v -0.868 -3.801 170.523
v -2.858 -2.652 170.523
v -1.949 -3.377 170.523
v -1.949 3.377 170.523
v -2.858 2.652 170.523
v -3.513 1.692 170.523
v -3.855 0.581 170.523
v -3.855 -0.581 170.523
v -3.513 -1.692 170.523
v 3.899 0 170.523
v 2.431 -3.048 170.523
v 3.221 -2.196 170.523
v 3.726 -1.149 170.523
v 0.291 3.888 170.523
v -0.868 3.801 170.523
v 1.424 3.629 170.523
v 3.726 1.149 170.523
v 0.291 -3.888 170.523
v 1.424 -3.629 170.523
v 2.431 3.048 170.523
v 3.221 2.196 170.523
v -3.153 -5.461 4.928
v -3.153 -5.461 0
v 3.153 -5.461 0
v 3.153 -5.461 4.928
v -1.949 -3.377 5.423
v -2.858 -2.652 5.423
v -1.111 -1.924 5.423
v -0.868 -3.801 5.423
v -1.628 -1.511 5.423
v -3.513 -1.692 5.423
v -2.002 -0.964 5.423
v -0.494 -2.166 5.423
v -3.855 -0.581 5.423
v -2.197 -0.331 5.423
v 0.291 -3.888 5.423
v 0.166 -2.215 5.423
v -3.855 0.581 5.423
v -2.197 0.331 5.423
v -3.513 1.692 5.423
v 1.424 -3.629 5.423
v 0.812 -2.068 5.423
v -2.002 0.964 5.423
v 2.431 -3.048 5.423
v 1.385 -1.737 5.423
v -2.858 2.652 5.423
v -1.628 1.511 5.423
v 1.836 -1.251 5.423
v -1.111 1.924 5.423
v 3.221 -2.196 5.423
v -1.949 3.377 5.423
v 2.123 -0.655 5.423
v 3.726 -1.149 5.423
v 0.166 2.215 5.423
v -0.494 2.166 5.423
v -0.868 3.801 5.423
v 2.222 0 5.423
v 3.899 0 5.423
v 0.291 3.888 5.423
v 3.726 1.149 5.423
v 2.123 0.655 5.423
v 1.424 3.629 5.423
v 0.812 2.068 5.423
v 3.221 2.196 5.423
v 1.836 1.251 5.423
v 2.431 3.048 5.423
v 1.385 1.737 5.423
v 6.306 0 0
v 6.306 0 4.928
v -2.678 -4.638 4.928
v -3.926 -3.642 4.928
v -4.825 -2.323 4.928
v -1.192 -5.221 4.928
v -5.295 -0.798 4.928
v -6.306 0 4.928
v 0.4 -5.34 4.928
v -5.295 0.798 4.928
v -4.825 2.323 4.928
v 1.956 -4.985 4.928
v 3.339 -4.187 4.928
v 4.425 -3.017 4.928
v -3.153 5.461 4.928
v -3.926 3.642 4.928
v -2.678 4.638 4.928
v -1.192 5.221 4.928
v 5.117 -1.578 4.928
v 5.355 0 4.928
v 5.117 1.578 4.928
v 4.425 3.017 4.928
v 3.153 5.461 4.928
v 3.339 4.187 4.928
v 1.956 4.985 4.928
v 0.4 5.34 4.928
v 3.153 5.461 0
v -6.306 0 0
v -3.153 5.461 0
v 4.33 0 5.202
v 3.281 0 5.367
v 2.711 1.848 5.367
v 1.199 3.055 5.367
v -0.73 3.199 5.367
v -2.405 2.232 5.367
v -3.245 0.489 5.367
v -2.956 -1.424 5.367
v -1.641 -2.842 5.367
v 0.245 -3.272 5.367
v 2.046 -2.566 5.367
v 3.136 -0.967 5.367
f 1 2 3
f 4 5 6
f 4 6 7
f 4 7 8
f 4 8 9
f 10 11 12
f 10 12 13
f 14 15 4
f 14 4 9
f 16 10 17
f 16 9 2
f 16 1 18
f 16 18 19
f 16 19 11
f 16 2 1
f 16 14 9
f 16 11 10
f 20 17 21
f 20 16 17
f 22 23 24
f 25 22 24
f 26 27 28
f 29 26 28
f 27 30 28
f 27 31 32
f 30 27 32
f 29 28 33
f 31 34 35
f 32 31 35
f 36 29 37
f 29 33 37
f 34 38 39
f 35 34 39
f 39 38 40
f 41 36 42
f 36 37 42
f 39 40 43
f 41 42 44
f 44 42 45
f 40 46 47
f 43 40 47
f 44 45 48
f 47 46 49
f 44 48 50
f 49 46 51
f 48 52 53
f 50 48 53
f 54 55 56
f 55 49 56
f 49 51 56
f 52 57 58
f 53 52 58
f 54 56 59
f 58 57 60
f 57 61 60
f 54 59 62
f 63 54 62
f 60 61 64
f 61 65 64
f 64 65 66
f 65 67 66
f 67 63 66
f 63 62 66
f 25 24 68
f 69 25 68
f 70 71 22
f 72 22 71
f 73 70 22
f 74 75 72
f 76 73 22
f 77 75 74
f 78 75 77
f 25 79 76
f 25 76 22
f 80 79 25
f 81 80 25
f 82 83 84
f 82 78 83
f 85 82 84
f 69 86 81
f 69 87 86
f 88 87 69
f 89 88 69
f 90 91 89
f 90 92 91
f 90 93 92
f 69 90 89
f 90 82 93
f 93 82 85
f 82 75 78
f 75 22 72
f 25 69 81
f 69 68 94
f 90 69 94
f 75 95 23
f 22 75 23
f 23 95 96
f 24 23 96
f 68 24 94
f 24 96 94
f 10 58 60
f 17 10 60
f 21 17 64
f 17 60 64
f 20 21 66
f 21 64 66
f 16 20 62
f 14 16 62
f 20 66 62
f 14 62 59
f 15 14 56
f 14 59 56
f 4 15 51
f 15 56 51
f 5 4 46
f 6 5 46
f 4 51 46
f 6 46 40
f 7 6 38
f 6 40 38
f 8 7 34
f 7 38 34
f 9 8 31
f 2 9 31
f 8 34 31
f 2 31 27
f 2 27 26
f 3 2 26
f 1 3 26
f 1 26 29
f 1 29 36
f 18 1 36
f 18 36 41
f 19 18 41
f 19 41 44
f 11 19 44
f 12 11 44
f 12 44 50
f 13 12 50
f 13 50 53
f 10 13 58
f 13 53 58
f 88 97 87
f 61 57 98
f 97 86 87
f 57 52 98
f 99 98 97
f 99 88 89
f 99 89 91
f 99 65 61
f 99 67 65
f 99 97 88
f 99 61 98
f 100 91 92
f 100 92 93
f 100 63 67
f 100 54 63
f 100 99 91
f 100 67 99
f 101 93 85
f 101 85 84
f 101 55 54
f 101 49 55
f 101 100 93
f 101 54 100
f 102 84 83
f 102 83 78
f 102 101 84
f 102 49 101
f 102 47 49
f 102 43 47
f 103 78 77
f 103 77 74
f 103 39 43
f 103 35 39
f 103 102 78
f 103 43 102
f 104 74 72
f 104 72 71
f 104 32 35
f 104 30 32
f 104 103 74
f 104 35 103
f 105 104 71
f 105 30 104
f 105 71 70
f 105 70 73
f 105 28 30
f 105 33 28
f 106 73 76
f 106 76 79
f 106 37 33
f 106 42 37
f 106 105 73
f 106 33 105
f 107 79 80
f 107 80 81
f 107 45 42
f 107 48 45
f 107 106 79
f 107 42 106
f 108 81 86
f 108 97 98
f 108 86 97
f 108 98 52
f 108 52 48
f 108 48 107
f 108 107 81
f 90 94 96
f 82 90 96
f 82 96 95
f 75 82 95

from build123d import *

# Parameters (mm, degrees)
BOSS_EXTRUDE1_DEPTH = 4.9276
SKETCH2_R           = 5.355070432
BOSS_EXTRUDE2_DEPTH = 0.4953
FILLET1_R           = 10.16
SKETCH6_R           = 3.8989
BOSS_EXTRUDE3_DEPTH = 165.1


with BuildPart() as part:
    # Sketch1 → Boss-Extrude1 (new body)
    with BuildSketch(Plane.XY):
        Polygon((6.305518095, 0), (3.152759047, 5.460738854), (-3.152759047, 5.460738854), (-6.305518095, 0), (-3.152759047, -5.460738854), (3.152759047, -5.460738854), align=None)
    extrude(amount=BOSS_EXTRUDE1_DEPTH)

    # Sketch2 → Boss-Extrude2 (add)
    with BuildSketch(Plane.XY.offset(4.9276)):
        Circle(SKETCH2_R)
    extrude(amount=BOSS_EXTRUDE2_DEPTH)

    # Fillet1
    # the kernel refuses this fillet: 10.16 mm, written as the material it takes off along each edge
    with BuildSketch(Plane(origin=(0, 0, 5.4229), x_dir=(1, 0, 0), z_dir=(0, -1, 0))) as fillet1_piece_1:
        with BuildLine():
            CenterArc((2.22151432, -10.16), FILLET1_R, 72.035909036, 17.964090964)
            Line((2.22151432, 0), (2.22151432, 0.2032))
            Line((2.22151432, 0.2032), (5.355070432, 0.2032))
            Line((5.355070432, 0.2032), (5.558270432, 0))
            ThreePointArc((5.558270432, 0), (5.558270432, -0.24765), (5.417741555, -0.302006))
            Line((5.417741555, -0.302006), (5.355070432, -0.4953))
        make_face()
    revolve(axis=Axis((0, 0, 5.4229), (0, 0, 1)), mode=Mode.SUBTRACT)

    # Sketch6 → Boss-Extrude3 (add)
    with BuildSketch(Plane.XY.offset(5.4229)):
        Circle(SKETCH6_R)
    extrude(amount=BOSS_EXTRUDE3_DEPTH)


solid = part.part
